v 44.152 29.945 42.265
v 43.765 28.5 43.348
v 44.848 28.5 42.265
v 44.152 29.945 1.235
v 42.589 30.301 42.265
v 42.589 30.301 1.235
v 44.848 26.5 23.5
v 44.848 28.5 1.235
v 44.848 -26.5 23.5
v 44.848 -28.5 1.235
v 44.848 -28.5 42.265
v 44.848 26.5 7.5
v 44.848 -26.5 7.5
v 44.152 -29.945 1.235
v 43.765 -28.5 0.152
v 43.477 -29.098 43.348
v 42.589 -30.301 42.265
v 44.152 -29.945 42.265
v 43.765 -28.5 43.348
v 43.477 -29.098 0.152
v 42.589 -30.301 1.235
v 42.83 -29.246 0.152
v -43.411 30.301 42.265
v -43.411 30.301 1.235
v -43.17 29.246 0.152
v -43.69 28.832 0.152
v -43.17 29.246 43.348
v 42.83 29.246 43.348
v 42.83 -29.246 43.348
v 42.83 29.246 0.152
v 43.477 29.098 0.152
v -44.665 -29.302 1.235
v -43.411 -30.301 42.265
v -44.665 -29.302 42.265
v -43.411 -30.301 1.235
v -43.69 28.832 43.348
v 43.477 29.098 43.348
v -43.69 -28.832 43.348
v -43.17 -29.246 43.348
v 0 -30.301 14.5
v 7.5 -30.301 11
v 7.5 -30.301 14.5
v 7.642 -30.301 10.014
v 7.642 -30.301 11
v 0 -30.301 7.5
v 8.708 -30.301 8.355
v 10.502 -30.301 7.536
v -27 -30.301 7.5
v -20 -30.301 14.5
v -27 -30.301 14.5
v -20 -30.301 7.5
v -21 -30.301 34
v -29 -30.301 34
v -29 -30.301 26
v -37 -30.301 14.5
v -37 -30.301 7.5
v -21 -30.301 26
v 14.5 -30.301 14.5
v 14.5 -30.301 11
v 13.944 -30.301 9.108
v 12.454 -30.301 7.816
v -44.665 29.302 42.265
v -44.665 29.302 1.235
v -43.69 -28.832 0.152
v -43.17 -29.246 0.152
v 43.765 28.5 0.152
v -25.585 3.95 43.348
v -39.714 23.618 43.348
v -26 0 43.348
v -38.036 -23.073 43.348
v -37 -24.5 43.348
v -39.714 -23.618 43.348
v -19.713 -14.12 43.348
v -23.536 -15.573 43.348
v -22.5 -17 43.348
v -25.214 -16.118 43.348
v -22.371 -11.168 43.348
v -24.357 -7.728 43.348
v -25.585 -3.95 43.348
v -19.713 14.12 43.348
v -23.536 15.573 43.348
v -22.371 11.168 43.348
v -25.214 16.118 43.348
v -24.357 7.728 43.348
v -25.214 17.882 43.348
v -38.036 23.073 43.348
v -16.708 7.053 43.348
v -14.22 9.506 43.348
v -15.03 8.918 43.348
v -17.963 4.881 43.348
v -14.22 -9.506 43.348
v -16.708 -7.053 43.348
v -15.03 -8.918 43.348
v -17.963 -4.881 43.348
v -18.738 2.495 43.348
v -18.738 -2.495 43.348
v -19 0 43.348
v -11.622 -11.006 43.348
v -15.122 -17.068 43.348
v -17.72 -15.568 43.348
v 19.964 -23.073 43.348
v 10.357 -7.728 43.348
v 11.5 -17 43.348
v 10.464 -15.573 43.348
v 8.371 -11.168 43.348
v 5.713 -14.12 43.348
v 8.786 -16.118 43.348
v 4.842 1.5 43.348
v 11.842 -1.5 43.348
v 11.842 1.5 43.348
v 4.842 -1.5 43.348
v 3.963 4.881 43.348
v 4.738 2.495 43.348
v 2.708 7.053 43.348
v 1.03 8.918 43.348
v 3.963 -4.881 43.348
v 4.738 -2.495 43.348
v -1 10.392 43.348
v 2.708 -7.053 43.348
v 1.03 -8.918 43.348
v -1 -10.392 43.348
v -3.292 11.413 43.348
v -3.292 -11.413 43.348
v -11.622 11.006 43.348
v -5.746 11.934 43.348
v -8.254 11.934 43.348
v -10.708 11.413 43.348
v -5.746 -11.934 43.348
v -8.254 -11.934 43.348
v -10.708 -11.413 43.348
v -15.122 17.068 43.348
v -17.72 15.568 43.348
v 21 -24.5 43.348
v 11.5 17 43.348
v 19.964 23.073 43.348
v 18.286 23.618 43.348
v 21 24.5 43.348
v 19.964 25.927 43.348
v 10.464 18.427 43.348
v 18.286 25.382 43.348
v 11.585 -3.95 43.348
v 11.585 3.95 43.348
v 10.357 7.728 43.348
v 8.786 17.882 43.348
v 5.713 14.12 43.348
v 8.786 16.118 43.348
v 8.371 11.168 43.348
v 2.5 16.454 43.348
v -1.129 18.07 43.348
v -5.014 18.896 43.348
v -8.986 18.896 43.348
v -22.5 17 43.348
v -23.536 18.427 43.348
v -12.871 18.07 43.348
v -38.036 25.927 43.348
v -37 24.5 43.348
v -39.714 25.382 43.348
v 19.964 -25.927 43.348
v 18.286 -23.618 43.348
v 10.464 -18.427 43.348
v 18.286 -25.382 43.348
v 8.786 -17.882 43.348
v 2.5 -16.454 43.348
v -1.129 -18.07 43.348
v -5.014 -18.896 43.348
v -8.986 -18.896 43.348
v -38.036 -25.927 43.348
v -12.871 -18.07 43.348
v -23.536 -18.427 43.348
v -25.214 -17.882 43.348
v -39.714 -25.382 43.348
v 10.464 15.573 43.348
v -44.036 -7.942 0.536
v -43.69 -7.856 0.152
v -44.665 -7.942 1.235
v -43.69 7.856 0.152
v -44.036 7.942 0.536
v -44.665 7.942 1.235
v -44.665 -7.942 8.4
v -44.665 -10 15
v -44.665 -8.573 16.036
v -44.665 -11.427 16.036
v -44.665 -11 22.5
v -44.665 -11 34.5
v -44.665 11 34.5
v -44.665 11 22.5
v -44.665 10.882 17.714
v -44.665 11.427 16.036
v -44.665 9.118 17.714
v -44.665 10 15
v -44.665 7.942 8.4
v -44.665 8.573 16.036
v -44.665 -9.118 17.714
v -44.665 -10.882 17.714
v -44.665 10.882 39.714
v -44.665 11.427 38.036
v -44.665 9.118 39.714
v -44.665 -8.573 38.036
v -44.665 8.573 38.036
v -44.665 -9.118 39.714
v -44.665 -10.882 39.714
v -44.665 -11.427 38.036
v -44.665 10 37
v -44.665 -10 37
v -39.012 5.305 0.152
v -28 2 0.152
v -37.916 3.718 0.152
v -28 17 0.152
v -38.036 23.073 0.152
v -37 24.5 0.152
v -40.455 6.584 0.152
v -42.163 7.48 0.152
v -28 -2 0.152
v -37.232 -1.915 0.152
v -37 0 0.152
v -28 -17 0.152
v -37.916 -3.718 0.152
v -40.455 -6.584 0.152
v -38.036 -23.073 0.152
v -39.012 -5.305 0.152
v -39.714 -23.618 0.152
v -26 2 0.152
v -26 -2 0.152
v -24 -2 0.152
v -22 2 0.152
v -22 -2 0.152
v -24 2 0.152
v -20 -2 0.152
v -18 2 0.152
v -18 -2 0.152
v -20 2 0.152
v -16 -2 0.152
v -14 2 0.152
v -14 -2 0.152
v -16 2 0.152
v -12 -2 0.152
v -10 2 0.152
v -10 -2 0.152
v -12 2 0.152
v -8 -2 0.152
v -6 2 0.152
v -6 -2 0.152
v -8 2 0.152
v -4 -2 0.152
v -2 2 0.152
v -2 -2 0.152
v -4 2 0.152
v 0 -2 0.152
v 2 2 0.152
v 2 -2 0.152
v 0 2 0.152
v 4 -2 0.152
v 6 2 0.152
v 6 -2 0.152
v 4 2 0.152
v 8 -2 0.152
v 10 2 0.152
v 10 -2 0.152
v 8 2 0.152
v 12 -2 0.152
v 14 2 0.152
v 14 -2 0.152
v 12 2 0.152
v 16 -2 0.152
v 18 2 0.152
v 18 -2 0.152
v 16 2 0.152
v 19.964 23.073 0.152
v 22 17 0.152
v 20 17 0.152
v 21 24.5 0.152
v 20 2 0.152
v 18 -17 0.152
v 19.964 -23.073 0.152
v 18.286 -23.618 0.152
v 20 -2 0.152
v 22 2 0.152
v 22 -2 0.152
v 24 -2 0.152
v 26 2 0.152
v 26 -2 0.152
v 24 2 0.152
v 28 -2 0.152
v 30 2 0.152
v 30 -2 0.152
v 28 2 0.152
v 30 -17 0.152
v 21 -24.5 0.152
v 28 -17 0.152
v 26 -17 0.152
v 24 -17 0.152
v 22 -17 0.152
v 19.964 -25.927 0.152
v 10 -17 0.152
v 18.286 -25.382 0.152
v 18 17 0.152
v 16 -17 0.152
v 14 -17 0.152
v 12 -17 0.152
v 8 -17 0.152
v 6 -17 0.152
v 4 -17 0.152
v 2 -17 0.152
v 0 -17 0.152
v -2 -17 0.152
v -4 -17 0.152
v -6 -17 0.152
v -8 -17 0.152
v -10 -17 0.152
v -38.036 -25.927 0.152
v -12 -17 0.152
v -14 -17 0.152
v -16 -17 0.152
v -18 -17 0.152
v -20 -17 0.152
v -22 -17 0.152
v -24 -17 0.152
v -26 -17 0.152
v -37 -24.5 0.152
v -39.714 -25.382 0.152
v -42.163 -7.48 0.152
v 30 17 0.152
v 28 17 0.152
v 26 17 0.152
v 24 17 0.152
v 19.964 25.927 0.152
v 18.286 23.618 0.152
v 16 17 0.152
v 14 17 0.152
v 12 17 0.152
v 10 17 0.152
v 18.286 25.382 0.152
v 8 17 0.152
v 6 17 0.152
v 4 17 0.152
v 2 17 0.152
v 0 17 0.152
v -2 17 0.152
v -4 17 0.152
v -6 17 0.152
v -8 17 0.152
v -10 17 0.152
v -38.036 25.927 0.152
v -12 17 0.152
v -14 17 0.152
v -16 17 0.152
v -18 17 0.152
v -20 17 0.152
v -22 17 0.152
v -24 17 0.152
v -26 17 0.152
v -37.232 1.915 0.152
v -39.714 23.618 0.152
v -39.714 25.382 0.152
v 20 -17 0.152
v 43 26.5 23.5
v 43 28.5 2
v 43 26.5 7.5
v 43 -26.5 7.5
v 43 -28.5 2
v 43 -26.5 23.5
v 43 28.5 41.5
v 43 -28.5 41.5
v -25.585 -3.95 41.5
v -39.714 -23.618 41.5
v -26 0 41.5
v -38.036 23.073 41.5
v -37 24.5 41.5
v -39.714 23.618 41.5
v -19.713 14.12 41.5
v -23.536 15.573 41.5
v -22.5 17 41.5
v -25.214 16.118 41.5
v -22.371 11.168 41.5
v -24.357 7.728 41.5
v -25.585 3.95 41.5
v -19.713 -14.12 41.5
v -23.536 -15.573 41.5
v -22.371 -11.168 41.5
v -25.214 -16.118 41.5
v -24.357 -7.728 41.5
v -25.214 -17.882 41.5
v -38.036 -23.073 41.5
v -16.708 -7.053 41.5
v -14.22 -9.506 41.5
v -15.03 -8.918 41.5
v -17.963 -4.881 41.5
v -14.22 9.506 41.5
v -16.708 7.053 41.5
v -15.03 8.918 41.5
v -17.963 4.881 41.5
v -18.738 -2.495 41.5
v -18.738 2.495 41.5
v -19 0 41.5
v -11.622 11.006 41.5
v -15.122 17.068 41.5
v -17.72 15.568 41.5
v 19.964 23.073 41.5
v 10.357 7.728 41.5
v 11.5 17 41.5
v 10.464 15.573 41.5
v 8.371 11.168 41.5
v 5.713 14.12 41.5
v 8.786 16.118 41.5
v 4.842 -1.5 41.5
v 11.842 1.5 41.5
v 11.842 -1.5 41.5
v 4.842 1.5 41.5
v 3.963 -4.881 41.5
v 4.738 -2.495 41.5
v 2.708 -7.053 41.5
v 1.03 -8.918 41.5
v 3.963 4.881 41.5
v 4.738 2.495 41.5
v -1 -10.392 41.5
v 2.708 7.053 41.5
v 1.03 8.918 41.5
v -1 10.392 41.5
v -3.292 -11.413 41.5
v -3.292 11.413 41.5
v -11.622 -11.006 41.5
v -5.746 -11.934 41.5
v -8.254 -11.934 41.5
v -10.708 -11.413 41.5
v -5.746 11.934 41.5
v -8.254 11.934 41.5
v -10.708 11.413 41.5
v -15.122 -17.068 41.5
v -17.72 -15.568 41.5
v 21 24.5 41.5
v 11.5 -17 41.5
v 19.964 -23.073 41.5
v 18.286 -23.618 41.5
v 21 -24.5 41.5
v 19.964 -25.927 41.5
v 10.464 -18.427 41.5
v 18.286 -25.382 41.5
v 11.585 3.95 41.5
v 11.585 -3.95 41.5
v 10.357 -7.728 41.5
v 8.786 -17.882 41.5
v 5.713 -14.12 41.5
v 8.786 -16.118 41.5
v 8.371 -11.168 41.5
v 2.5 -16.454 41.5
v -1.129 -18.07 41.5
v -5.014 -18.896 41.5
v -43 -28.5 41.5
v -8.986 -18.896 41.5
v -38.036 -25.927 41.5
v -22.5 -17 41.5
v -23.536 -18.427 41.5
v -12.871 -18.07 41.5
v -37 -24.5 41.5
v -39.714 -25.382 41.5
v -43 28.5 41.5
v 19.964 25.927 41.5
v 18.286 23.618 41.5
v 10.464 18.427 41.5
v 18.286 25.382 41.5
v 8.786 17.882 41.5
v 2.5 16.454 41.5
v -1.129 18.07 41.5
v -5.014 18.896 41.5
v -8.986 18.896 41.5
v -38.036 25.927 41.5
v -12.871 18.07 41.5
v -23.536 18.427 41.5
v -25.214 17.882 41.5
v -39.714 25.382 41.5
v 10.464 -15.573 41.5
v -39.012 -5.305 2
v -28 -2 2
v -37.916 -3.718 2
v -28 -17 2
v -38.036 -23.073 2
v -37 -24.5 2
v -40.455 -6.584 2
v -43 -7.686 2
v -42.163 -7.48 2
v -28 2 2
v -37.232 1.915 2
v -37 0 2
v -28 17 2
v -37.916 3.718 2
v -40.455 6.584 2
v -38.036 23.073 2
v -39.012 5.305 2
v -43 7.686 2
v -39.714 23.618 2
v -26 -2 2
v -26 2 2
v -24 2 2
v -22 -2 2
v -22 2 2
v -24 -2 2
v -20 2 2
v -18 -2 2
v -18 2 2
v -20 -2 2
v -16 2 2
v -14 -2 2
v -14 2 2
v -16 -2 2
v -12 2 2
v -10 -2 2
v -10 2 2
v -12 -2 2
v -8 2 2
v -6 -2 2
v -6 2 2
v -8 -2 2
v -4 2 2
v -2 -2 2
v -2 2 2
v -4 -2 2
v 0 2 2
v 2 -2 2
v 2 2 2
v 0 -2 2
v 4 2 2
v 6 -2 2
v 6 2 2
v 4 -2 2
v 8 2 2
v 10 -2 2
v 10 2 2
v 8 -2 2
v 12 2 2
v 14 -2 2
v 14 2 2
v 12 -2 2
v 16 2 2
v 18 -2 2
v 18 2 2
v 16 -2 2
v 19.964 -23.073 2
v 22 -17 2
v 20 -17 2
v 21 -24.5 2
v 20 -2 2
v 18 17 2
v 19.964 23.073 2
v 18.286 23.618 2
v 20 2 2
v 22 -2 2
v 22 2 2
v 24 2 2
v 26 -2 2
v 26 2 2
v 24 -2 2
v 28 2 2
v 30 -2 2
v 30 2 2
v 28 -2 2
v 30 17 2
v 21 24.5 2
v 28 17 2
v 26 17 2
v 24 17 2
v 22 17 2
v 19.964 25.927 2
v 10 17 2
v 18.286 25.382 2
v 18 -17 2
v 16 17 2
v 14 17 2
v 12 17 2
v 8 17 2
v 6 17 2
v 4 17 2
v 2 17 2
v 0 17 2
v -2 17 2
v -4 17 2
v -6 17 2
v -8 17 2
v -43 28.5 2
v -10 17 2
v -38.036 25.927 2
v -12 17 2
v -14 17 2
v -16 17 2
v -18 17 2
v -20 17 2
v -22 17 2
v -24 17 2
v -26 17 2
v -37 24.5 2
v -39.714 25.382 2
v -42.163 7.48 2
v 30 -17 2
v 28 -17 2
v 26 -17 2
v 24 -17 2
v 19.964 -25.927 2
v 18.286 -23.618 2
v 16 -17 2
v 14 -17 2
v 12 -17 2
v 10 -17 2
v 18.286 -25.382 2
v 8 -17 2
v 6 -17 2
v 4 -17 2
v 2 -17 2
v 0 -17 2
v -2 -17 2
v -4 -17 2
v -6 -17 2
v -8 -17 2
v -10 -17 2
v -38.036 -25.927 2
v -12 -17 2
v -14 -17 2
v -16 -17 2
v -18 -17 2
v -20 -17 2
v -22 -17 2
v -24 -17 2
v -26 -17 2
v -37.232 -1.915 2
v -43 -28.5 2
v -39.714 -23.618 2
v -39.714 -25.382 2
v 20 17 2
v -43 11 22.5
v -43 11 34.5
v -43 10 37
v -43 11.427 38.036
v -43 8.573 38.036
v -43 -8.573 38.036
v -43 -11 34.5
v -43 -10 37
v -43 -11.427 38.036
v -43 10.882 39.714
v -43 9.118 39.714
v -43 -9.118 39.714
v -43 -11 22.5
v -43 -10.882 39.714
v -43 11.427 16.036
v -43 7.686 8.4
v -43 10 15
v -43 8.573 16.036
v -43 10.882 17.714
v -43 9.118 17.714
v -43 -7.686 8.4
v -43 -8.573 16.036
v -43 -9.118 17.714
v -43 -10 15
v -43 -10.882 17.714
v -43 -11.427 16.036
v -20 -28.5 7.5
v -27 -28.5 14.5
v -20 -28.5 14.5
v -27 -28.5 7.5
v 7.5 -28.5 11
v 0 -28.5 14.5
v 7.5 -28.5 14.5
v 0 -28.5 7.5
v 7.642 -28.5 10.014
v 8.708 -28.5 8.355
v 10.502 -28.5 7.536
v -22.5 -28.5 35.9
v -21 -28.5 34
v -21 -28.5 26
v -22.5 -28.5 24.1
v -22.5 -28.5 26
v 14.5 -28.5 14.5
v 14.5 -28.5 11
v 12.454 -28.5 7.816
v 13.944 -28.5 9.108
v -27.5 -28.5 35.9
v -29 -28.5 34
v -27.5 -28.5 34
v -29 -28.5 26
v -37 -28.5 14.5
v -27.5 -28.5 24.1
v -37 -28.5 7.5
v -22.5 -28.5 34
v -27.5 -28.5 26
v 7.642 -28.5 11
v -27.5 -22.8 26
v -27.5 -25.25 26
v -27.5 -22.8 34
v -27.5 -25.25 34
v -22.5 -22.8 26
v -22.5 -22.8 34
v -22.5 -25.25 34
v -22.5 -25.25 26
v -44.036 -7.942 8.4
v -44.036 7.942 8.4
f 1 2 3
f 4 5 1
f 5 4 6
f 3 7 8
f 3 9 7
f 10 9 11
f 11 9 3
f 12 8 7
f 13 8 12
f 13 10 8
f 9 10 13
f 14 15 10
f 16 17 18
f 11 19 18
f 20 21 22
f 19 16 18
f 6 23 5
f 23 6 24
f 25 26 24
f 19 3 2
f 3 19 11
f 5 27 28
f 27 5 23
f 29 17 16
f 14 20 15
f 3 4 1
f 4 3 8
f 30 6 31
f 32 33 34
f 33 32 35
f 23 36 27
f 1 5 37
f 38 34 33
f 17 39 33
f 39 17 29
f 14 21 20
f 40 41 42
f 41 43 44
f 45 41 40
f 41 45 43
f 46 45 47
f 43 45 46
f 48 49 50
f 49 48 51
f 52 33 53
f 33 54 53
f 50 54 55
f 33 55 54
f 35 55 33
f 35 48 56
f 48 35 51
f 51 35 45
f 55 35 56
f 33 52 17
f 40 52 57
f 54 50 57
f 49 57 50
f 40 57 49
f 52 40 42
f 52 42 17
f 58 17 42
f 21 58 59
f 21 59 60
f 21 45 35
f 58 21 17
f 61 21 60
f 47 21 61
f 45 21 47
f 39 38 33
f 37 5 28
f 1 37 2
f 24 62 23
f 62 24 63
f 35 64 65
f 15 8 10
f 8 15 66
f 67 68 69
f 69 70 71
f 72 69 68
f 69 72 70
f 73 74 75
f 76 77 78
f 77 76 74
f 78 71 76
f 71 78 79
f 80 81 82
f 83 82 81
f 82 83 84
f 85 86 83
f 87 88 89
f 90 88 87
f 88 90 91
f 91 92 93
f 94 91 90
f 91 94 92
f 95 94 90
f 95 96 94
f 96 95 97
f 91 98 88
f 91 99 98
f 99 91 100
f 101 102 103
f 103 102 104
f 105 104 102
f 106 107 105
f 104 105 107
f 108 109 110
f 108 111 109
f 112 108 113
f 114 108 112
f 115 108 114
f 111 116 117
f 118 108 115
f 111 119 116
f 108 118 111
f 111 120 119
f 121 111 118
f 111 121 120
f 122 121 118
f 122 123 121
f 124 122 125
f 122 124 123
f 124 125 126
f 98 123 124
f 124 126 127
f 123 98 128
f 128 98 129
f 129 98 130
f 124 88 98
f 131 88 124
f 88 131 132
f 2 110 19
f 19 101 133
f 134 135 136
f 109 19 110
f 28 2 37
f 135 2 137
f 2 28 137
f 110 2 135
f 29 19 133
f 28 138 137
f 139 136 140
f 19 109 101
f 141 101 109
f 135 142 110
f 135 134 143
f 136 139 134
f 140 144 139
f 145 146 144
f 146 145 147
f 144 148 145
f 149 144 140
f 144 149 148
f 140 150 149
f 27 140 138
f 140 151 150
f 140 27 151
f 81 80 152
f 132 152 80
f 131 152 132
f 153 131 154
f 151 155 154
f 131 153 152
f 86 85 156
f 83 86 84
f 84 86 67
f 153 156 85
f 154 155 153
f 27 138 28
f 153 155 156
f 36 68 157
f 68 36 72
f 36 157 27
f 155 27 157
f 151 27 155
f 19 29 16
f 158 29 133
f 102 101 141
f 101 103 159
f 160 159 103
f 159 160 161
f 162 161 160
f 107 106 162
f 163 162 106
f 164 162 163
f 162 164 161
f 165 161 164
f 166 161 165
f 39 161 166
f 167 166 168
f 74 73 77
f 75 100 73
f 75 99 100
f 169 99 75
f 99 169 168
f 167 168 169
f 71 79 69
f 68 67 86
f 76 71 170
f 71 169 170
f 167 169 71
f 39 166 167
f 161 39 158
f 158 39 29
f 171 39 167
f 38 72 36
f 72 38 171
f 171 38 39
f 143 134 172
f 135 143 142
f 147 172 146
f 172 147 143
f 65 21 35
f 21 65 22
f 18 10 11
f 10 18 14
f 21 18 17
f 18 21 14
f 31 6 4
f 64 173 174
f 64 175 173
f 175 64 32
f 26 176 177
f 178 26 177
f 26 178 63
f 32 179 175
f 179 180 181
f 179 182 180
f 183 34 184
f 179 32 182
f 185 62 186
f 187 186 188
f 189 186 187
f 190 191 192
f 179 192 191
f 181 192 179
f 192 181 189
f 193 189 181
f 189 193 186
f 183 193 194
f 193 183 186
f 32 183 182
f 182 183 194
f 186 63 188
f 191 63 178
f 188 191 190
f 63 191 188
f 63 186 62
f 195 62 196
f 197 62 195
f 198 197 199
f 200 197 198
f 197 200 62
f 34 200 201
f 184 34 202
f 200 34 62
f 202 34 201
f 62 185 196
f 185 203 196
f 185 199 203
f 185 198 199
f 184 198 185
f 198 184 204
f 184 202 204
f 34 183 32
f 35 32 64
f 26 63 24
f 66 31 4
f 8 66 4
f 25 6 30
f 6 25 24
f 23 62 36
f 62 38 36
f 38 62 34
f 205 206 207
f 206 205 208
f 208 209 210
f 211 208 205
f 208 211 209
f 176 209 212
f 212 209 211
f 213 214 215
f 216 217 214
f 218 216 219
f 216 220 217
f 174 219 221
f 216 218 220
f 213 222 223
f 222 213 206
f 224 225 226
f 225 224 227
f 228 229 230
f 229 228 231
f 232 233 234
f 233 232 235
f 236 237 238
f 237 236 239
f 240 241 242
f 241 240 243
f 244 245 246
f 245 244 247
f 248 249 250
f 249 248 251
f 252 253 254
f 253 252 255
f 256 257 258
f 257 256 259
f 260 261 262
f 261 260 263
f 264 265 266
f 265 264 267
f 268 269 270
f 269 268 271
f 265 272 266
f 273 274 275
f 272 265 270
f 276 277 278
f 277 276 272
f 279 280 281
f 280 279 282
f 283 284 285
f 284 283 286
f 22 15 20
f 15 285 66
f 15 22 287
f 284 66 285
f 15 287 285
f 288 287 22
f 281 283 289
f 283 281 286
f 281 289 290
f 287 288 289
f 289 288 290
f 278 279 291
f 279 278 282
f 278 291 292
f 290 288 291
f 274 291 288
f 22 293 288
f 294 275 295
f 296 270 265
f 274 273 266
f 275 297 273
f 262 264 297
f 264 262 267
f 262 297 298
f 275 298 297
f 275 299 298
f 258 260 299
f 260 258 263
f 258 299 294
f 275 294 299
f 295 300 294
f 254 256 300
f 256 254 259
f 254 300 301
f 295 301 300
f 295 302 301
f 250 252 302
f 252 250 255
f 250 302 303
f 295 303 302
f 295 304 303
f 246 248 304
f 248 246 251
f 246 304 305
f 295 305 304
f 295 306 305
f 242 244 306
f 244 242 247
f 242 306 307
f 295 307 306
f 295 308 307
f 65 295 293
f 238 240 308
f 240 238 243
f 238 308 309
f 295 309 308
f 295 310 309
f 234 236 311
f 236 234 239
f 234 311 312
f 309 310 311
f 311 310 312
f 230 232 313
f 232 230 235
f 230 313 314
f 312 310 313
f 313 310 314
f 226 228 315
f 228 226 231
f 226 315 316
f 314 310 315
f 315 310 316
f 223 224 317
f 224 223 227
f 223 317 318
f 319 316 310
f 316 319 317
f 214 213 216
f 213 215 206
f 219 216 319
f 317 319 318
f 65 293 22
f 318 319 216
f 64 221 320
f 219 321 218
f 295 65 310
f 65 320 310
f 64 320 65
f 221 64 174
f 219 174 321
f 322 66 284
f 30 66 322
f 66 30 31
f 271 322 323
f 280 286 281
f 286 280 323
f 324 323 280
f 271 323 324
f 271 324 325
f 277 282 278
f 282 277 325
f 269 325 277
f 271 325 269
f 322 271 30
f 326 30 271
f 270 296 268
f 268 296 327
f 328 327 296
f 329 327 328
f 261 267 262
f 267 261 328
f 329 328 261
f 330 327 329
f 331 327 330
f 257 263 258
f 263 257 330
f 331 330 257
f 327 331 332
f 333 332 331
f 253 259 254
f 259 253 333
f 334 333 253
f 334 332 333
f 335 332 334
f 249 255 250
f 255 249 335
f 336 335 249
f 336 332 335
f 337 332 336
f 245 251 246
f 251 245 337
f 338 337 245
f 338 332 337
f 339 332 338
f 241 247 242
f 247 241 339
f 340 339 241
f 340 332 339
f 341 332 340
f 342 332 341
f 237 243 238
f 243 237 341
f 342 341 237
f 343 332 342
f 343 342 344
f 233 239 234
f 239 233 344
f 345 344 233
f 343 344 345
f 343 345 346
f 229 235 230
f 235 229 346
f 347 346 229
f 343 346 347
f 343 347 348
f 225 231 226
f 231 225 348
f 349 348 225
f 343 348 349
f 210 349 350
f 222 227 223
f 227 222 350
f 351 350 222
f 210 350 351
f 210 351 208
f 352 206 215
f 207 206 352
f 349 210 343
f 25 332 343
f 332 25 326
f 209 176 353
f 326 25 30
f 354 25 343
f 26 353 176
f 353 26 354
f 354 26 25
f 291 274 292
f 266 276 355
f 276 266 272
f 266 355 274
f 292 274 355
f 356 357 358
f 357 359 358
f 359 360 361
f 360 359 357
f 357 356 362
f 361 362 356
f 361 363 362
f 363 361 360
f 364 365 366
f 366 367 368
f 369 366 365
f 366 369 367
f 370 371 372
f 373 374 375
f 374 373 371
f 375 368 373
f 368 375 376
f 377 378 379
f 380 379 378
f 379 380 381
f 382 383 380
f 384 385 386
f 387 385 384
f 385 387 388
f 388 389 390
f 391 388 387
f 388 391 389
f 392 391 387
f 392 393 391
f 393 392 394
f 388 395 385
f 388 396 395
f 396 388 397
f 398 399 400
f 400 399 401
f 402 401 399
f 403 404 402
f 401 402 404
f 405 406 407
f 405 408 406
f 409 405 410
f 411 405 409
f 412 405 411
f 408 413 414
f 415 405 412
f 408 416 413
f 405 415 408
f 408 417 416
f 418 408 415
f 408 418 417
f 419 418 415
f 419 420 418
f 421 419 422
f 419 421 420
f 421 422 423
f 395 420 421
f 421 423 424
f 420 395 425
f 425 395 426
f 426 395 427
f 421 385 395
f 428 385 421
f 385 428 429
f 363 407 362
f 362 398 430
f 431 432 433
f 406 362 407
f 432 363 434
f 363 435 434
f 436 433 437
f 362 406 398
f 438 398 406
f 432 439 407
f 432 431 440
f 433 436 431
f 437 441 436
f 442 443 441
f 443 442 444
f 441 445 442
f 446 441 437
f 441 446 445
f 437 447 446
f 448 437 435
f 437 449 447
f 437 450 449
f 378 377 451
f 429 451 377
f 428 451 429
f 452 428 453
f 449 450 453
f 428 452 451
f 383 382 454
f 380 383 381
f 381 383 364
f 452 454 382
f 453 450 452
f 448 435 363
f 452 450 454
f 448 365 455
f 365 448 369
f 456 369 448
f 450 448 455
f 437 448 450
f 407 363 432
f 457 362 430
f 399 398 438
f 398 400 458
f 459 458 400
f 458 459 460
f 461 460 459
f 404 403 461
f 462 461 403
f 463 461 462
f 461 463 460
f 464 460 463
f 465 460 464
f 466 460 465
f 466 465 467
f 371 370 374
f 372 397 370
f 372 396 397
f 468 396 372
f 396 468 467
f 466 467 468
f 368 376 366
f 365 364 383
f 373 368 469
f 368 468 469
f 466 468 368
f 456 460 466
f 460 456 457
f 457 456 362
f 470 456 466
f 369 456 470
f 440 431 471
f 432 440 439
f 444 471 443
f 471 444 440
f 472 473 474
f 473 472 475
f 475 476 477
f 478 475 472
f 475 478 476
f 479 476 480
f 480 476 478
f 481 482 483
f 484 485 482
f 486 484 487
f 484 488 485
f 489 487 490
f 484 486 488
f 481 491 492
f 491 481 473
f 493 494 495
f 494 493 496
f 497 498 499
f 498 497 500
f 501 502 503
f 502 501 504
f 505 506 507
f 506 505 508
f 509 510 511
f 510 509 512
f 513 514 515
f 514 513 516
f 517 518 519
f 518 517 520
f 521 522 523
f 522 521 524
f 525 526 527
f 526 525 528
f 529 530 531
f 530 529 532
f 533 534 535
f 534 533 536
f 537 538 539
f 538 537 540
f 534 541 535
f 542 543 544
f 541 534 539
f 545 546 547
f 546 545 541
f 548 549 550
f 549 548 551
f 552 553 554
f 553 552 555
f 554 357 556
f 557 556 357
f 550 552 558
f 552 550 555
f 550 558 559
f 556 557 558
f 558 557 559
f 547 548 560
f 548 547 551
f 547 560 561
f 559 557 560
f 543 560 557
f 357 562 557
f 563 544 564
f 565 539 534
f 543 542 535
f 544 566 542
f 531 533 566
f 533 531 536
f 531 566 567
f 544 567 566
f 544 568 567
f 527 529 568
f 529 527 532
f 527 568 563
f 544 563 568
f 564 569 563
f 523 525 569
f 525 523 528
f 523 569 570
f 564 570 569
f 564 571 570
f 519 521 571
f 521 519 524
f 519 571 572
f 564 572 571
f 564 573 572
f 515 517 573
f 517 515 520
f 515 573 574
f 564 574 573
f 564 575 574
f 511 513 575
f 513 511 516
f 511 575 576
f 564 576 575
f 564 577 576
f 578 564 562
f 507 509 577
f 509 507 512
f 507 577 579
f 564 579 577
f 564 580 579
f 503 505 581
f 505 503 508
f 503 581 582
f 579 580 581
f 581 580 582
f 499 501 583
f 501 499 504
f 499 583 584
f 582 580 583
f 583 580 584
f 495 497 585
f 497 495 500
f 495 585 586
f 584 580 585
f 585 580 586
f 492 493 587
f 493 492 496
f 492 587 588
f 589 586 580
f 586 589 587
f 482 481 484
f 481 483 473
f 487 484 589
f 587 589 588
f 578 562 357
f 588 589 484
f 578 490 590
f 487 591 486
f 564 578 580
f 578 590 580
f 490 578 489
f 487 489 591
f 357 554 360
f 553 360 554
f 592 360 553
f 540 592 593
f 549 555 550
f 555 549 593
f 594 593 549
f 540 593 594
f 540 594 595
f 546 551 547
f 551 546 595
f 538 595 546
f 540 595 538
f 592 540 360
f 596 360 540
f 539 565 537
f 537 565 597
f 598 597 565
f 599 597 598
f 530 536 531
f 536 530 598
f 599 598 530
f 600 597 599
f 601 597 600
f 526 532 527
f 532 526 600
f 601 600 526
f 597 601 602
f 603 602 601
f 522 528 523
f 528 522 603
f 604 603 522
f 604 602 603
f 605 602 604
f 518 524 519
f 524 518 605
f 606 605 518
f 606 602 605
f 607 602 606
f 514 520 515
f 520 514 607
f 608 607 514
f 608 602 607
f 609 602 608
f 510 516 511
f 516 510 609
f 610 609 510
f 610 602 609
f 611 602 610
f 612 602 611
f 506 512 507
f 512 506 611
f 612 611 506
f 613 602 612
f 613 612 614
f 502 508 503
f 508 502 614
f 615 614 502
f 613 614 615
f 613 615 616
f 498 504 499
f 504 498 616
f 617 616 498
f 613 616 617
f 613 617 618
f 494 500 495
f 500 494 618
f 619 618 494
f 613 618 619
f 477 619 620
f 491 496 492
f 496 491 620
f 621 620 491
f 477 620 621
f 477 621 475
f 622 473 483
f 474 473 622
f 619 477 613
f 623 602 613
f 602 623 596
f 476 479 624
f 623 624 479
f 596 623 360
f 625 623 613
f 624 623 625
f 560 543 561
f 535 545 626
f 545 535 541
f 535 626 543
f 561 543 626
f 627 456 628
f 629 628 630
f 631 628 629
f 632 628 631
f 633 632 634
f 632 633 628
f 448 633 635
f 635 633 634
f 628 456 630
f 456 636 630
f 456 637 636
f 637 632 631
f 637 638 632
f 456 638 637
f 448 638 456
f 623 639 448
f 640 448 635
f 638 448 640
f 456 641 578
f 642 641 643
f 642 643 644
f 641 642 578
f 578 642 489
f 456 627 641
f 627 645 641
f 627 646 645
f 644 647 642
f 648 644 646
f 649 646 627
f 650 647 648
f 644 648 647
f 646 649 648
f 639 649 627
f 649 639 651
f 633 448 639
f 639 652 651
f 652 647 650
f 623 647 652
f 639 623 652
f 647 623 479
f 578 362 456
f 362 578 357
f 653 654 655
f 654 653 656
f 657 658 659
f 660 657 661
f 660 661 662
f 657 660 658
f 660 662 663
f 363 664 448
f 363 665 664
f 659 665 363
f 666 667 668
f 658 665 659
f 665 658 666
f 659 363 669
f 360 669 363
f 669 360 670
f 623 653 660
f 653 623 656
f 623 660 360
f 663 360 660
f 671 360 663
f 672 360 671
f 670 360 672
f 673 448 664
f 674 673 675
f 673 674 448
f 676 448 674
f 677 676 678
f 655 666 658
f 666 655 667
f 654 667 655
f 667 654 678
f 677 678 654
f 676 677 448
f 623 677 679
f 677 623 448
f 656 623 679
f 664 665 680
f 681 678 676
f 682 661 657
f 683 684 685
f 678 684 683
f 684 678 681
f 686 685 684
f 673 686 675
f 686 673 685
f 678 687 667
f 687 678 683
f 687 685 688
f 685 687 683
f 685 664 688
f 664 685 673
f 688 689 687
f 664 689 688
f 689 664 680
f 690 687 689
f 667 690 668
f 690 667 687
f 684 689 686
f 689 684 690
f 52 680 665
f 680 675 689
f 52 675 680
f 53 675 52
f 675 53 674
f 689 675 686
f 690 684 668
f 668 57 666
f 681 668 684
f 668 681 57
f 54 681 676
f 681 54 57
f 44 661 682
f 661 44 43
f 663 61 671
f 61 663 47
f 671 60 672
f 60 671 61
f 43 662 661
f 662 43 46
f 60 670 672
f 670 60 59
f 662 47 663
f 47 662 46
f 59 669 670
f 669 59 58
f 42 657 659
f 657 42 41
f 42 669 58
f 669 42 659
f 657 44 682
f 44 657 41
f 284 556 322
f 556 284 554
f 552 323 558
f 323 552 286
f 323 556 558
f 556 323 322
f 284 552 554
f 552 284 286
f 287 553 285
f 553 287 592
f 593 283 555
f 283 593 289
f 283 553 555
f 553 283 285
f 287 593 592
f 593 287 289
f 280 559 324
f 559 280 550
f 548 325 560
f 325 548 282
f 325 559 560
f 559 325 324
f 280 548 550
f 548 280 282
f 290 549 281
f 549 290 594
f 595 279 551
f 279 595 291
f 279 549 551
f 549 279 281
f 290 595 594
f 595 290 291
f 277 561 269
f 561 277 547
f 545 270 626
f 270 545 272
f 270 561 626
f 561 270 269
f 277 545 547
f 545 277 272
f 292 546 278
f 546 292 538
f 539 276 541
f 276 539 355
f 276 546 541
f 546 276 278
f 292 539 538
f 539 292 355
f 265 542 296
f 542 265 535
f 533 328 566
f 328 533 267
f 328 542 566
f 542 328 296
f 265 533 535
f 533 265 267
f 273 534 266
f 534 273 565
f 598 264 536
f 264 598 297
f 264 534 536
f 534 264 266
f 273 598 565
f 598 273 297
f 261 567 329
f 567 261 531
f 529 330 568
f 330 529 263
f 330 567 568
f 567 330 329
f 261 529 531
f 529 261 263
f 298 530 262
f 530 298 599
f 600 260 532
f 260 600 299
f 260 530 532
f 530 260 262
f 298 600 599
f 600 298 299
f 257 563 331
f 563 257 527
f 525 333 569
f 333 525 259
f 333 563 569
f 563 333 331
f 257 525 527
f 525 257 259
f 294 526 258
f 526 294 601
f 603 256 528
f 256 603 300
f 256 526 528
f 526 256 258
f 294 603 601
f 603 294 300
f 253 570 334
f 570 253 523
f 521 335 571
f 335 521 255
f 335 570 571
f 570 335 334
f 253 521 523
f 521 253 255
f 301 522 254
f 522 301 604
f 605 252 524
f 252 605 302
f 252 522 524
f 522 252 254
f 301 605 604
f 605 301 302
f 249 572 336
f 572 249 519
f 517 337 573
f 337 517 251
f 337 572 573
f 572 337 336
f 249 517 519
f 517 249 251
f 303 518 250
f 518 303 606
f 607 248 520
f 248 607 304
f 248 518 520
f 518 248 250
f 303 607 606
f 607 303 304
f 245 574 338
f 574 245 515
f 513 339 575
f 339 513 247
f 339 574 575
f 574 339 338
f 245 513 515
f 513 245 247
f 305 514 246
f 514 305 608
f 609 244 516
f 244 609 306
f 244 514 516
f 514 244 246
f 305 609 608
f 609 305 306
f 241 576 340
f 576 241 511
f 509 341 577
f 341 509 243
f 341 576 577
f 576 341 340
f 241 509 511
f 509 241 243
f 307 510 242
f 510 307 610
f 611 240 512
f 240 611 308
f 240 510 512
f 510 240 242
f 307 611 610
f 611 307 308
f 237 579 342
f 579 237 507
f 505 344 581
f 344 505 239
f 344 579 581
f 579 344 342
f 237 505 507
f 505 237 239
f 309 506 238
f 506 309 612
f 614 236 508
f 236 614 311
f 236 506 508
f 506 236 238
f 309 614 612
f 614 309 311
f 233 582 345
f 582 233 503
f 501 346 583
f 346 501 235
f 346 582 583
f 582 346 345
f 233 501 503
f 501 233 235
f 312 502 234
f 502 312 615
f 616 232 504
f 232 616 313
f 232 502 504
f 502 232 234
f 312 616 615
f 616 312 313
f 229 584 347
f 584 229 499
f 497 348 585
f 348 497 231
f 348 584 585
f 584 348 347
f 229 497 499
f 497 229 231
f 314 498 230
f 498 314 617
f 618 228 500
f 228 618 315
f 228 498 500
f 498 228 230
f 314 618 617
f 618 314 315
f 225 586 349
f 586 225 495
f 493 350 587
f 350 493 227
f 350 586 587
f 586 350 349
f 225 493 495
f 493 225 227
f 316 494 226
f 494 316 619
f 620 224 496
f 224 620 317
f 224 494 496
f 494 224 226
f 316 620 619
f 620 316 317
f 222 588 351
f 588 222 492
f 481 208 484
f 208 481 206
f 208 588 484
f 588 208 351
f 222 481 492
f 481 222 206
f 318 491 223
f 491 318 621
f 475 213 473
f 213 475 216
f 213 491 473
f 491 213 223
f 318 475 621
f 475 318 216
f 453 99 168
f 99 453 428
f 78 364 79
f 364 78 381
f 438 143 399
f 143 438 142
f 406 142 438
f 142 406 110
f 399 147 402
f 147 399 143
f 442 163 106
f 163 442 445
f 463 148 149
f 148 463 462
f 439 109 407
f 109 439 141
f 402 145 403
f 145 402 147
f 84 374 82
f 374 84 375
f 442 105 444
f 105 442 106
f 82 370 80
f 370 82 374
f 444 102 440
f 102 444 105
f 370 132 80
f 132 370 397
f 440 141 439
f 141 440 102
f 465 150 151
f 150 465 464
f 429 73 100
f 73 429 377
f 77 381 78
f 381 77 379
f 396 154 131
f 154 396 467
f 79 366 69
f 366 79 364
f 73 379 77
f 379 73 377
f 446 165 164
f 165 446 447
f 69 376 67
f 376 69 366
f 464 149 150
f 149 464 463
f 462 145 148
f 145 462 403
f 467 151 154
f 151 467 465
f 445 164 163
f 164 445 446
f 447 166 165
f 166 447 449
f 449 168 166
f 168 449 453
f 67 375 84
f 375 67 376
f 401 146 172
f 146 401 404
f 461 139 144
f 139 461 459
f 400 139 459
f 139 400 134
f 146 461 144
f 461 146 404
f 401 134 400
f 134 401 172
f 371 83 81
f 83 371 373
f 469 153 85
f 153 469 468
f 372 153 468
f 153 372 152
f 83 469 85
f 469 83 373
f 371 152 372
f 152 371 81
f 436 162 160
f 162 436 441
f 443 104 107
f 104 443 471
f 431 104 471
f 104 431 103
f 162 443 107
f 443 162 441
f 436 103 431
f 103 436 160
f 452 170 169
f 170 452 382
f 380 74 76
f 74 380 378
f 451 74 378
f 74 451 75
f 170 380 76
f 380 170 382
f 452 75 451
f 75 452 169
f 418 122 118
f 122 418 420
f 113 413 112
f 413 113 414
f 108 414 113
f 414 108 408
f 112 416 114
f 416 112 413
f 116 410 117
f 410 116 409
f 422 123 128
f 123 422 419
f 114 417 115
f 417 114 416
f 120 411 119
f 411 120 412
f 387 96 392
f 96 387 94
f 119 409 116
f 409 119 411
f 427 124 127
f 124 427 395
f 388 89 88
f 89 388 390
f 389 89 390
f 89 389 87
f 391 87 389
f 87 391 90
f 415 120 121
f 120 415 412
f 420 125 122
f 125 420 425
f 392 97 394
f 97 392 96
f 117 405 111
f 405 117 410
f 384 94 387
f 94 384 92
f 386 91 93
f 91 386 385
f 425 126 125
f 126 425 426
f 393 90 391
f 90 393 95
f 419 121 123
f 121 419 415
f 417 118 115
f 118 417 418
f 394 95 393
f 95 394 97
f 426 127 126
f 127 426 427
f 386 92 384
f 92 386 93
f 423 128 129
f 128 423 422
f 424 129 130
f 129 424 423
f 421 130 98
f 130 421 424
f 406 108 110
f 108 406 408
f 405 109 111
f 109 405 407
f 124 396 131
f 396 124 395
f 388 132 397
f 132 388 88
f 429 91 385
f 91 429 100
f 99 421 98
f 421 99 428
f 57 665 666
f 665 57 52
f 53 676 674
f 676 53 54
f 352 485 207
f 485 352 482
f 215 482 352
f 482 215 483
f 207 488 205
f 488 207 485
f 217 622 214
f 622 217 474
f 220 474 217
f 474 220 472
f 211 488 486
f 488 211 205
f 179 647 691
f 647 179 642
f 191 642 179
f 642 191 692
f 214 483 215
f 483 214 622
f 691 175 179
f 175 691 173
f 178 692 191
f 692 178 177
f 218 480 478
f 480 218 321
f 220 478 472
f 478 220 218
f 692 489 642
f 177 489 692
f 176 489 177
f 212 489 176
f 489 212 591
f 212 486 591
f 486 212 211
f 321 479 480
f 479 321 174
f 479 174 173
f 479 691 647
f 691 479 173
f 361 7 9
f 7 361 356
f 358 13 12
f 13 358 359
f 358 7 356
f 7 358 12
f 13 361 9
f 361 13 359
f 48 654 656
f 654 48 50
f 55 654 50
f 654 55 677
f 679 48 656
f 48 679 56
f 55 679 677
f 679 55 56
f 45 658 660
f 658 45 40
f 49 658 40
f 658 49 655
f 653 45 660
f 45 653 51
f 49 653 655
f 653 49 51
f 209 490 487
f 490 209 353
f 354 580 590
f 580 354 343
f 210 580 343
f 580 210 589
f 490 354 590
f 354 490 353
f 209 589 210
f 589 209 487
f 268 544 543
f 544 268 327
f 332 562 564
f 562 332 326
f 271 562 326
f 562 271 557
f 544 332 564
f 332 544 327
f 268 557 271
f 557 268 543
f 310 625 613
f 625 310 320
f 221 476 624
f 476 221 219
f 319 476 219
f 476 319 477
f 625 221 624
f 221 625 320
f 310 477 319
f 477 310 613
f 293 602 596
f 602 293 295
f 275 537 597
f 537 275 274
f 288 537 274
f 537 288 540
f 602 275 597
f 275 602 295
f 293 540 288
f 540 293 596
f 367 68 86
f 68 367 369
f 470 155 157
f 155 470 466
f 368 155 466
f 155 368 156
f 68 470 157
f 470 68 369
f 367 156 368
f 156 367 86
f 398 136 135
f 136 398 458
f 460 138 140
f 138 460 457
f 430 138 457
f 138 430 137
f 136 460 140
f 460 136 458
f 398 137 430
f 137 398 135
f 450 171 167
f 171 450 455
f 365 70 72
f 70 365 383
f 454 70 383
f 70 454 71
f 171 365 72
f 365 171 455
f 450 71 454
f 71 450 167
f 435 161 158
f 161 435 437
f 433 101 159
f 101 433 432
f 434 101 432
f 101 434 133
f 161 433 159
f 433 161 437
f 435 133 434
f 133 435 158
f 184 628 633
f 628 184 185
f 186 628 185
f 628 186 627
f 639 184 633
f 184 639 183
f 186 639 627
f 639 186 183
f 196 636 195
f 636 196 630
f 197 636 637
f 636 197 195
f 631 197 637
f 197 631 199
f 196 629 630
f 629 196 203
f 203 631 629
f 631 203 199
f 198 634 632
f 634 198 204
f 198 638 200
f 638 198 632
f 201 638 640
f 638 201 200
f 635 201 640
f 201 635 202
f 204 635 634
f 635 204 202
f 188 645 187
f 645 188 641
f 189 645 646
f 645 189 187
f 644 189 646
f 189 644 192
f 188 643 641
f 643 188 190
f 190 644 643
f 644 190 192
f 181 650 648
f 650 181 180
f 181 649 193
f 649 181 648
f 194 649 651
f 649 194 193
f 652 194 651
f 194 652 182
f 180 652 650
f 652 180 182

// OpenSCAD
// file: common.scad
// common

board_height = 1.5;

usb_height = 16;

screen_width=22;
screen_width_outer=24;
screen_height = 12;
screen_inner_offset=5;
screen_screw_diameter=3;
screen_screew_offset=1;
screen_height_outer=27;

minijack_diameter = 7;
minijack_offset = 54;

spacer_lower = 4;

box_length_inner = 86;
box_width_inner = 57;
box_height_inner = spacer_lower + board_height + minijack_diameter+screen_height_outer;

box_border_size = 2;

box_length_outer= box_length_inner + box_border_size*2;
box_width_outer = box_width_inner+ box_border_size*2;
box_height_outer = box_height_inner+ box_border_size*2;

sdcard_slot_height = 2.5 + spacer_lower + box_border_size;
sdcard_slot_radius= 8;
        
power_height= 7;
power_width = 10;
power_offset = 11;

hdmi_height = power_height;
hdmi_width = 20;
hdmi_offset= 33; 

low_vent_rows=14;
low_vent_length=15;
low_vent_width = 2;
low_vent_spread_x=4;
low_vent_spread_y=2;

screw_offset_y = 4;
screw_offset_x_front = 4.5;
screw_distance_x= 58;
screw_radius=1.5;

upper_vent_width=40;
upper_vent_diameter=38;
upper_vent_inner_diameter=24;
upper_vent_hole_radius=1.5;
upper_vent_hole_offset=3;
upper_vent_bridge_width=3;
upper_vent_offset=16;

collision_spacer = 0.1;
box_lower_height = box_border_size+ board_height+spacer_lower + minijack_diameter;

actual_button_width = 6;
button_width = actual_button_width+2;
button_height_offset = 2;
button_height_full = 5;
button_holder_height = 2;
button_diameter = 3;
button_body_height = button_height_full - button_height_offset;
button_attach_width = 2;
button_attach_height = button_height_full+button_attach_width;
// main file
include <./common.scad>

module box_inner(){
    cube([box_length_inner, box_width_inner, box_height_inner], center = true);
}

module screen_screw_hole(){
translate([
    -box_length_outer/2-collision_spacer,
   0,
    box_height_inner])
rotate([0,90,0])
cylinder(h=box_border_size+collision_spacer*2,d=screen_screw_diameter);
}
module button_model() {
    %
    union() {
        translate([0,0,button_body_height/2])
        cube([actual_button_width,actual_button_width, button_body_height], center = true);
        
        translate([0,0,button_body_height])
        cylinder(h = button_height_offset, d = button_diameter);
    }
}
module button_attach(){
    union(){
        translate([0,0,button_attach_width])
        button_model();
        
        difference() {
            hull(){
                translate([0,0,button_attach_height-1])
                cube([actual_button_width-1,button_width+ button_attach_width*2,1],center = true);

                cube([actual_button_width-1,button_width,1],center = true);
            }
            
            translate([0,0,button_height_full/2+button_attach_width])
            cube([button_width+collision_spacer,button_width,button_height_full+collision_spacer],center = true);
        }

        
    }
}

module upper_vent_hole(){
translate([
            -box_length_inner/2+upper_vent_width/2+upper_vent_offset,
            0,
            box_height_inner+box_border_size-collision_spacer])
        difference(){
            union(){
                cylinder(d=upper_vent_diameter,h=box_border_size+collision_spacer*2,center=false );
                relative_hole_offset=upper_vent_width/2-upper_vent_hole_offset;
                translate([relative_hole_offset, relative_hole_offset, 0])
                cylinder(r=upper_vent_hole_radius,h=box_border_size+collision_spacer*2,center=false );
                translate([-relative_hole_offset, relative_hole_offset, 0])
                cylinder(r=upper_vent_hole_radius,h=box_border_size+collision_spacer*2,center=false );
                translate([relative_hole_offset,-relative_hole_offset, 0])
                cylinder(r=upper_vent_hole_radius,h=box_border_size+collision_spacer*2,center=false );
                translate([-relative_hole_offset, -relative_hole_offset, 0])
                cylinder(r=upper_vent_hole_radius,h=box_border_size+collision_spacer*2,center=false );
            }
            
            cylinder(d=upper_vent_inner_diameter,h=box_border_size+collision_spacer*2,center=false );
            
            translate([0,-upper_vent_bridge_width/2,0])
            cube([upper_vent_width/2,upper_vent_bridge_width,box_border_size+collision_spacer*2]);
            
            rotate([0,0,120])
            translate([0,-upper_vent_bridge_width/2,0])
            cube([upper_vent_width/2,upper_vent_bridge_width,box_border_size+collision_spacer*2]);
            
            rotate([0,0,240])
            translate([0,-upper_vent_bridge_width/2,0])
            cube([upper_vent_width/2,upper_vent_bridge_width,box_border_size+collision_spacer*2]);
        }
}

module box_whole(){
    button_position_offset_x=20;
    button_position_offset_z=30;
    difference(){
        translate([0,0,box_border_size + box_height_inner/2])
        union(){
            difference(){
                minkowski(){
                    box_inner();
                    sphere(r=box_border_size);
                };
                
                // inner
                box_inner();
            }
            
            // display button attachment
            translate([
                -box_length_outer/2+button_position_offset_x,
                -box_width_outer/2+button_attach_height+collision_spacer*2,
                -box_height_outer/2+button_position_offset_z]) 
            rotate([90,0,0])
            button_attach();
        }

        // button hole
        translate([
            -box_length_outer/2+button_position_offset_x-button_width/2,
            -box_width_outer/2,
            button_position_offset_z-button_width/2 ]) 
        cube([button_width,box_border_size+collision_spacer*2,button_width],center = false);
        
        
        // sd card slot
        slot_depth = box_border_size+collision_spacer *2;
        translate([- box_length_outer/2,0,sdcard_slot_height/2 -collision_spacer])
        cylinder(h = sdcard_slot_height, r=sdcard_slot_radius, center= true);
        
        // usb and rj45
        translate([
            box_length_inner/2 + box_border_size/2 -collision_spacer, 
            0, 
            box_border_size + usb_height/2 + board_height+spacer_lower])
        cube([slot_depth,box_width_inner -4,usb_height],center=true);
        
        // audio jack
        translate([
            - box_length_inner/2+ minijack_offset,
            -box_width_outer/2 + box_border_size + collision_spacer,
            box_border_size+board_height+spacer_lower + minijack_diameter/2])
        rotate([90,0,0])
        union(){
            cylinder(d = minijack_diameter, h = slot_depth);
            translate([-minijack_diameter/2,0,0])
            cube([minijack_diameter,minijack_diameter/2,slot_depth],center=false);
        }
        
        // power usb
        translate([
            -box_length_inner/2+power_offset-power_width/2,
            -box_width_inner/2 - box_border_size + collision_spacer,
            box_border_size + spacer_lower + board_height])
        cube([power_width,slot_depth,power_height], center=false);
        
        // hdmi
        translate([
            -box_length_inner/2+hdmi_offset-hdmi_width/2,
            -box_width_inner/2 - box_border_size + collision_spacer,
            box_border_size + spacer_lower + board_height])
        cube([hdmi_width,slot_depth,hdmi_height], center=false);
        
        // bottom ventilation gaps
        low_vent_total_length = low_vent_rows * (low_vent_spread_y + low_vent_width);
        for(i=[0:low_vent_rows]){
            translate([low_vent_total_length/2 - low_vent_spread_x*i, low_vent_spread_y,0])
            cube([low_vent_width,low_vent_length,box_border_size+collision_spacer*2]);
            
            mirror([0,1,0])
            translate([low_vent_total_length/2 - low_vent_spread_x*i, low_vent_spread_y,0])
            cube([low_vent_width,low_vent_length,box_border_size+collision_spacer*2]);            
        }
        
        // screw holes bottom    
        translate([-box_length_inner/2+screw_offset_x_front,box_width_inner/2-screw_offset_y,-collision_spacer])
        cylinder(r=screw_radius,h=box_border_size+collision_spacer*2);
        
        translate([-box_length_inner/2+screw_offset_x_front + screw_distance_x,box_width_inner/2-screw_offset_y,-collision_spacer])
        cylinder(r=screw_radius,h=box_border_size+collision_spacer*2);
        
        translate([-box_length_inner/2+screw_offset_x_front,-box_width_inner/2+screw_offset_y,-collision_spacer])
        cylinder(r=screw_radius,h=box_border_size+collision_spacer*2);
        
        translate([-box_length_inner/2+screw_offset_x_front + screw_distance_x,-box_width_inner/2+screw_offset_y,-collision_spacer])
        cylinder(r=screw_radius,h=box_border_size+collision_spacer*2);
        
        // screw holes top    
        translate([-box_length_inner/2+screw_offset_x_front,box_width_inner/2-screw_offset_y,box_height_inner+box_border_size-collision_spacer])
        cylinder(r=screw_radius,h=box_border_size+collision_spacer*2);
        
        translate([-box_length_inner/2+screw_offset_x_front + screw_distance_x,box_width_inner/2-screw_offset_y,box_height_inner+box_border_size-collision_spacer])
        cylinder(r=screw_radius,h=box_border_size+collision_spacer*2);
        
        translate([-box_length_inner/2+screw_offset_x_front,-box_width_inner/2+screw_offset_y,box_height_inner+box_border_size-collision_spacer])
        cylinder(r=screw_radius,h=box_border_size+collision_spacer*2);
        
        translate([-box_length_inner/2+screw_offset_x_front + screw_distance_x,-box_width_inner/2+screw_offset_y,box_height_inner+box_border_size-collision_spacer])
        cylinder(r=screw_radius,h=box_border_size+collision_spacer*2);
        
        // screen
        screen_bottom_offset=box_height_inner-screen_inner_offset-screen_height;
        
        translate([-box_length_outer/2+collision_spacer+box_border_size,-screen_width/2,screen_bottom_offset])
        rotate([0,0,90])
        cube([screen_width,box_border_size+collision_spacer*2,screen_height]);
        
        // screen screw holes
        translate([0,screen_width/2-screen_screew_offset,-screen_screew_offset])
        screen_screw_hole();
        translate([0,-screen_width/2+screen_screew_offset,-screen_screew_offset])
        screen_screw_hole();
        translate([0,screen_width/2-screen_screew_offset,-screen_height_outer+screen_screw_diameter+screen_screew_offset])
        screen_screw_hole();
        translate([0,-screen_width/2+screen_screew_offset,-screen_height_outer+screen_screw_diameter+screen_screew_offset])
        screen_screw_hole();
        
        // upper vent
        upper_vent_hole();
    }
}


// view
box_whole();
